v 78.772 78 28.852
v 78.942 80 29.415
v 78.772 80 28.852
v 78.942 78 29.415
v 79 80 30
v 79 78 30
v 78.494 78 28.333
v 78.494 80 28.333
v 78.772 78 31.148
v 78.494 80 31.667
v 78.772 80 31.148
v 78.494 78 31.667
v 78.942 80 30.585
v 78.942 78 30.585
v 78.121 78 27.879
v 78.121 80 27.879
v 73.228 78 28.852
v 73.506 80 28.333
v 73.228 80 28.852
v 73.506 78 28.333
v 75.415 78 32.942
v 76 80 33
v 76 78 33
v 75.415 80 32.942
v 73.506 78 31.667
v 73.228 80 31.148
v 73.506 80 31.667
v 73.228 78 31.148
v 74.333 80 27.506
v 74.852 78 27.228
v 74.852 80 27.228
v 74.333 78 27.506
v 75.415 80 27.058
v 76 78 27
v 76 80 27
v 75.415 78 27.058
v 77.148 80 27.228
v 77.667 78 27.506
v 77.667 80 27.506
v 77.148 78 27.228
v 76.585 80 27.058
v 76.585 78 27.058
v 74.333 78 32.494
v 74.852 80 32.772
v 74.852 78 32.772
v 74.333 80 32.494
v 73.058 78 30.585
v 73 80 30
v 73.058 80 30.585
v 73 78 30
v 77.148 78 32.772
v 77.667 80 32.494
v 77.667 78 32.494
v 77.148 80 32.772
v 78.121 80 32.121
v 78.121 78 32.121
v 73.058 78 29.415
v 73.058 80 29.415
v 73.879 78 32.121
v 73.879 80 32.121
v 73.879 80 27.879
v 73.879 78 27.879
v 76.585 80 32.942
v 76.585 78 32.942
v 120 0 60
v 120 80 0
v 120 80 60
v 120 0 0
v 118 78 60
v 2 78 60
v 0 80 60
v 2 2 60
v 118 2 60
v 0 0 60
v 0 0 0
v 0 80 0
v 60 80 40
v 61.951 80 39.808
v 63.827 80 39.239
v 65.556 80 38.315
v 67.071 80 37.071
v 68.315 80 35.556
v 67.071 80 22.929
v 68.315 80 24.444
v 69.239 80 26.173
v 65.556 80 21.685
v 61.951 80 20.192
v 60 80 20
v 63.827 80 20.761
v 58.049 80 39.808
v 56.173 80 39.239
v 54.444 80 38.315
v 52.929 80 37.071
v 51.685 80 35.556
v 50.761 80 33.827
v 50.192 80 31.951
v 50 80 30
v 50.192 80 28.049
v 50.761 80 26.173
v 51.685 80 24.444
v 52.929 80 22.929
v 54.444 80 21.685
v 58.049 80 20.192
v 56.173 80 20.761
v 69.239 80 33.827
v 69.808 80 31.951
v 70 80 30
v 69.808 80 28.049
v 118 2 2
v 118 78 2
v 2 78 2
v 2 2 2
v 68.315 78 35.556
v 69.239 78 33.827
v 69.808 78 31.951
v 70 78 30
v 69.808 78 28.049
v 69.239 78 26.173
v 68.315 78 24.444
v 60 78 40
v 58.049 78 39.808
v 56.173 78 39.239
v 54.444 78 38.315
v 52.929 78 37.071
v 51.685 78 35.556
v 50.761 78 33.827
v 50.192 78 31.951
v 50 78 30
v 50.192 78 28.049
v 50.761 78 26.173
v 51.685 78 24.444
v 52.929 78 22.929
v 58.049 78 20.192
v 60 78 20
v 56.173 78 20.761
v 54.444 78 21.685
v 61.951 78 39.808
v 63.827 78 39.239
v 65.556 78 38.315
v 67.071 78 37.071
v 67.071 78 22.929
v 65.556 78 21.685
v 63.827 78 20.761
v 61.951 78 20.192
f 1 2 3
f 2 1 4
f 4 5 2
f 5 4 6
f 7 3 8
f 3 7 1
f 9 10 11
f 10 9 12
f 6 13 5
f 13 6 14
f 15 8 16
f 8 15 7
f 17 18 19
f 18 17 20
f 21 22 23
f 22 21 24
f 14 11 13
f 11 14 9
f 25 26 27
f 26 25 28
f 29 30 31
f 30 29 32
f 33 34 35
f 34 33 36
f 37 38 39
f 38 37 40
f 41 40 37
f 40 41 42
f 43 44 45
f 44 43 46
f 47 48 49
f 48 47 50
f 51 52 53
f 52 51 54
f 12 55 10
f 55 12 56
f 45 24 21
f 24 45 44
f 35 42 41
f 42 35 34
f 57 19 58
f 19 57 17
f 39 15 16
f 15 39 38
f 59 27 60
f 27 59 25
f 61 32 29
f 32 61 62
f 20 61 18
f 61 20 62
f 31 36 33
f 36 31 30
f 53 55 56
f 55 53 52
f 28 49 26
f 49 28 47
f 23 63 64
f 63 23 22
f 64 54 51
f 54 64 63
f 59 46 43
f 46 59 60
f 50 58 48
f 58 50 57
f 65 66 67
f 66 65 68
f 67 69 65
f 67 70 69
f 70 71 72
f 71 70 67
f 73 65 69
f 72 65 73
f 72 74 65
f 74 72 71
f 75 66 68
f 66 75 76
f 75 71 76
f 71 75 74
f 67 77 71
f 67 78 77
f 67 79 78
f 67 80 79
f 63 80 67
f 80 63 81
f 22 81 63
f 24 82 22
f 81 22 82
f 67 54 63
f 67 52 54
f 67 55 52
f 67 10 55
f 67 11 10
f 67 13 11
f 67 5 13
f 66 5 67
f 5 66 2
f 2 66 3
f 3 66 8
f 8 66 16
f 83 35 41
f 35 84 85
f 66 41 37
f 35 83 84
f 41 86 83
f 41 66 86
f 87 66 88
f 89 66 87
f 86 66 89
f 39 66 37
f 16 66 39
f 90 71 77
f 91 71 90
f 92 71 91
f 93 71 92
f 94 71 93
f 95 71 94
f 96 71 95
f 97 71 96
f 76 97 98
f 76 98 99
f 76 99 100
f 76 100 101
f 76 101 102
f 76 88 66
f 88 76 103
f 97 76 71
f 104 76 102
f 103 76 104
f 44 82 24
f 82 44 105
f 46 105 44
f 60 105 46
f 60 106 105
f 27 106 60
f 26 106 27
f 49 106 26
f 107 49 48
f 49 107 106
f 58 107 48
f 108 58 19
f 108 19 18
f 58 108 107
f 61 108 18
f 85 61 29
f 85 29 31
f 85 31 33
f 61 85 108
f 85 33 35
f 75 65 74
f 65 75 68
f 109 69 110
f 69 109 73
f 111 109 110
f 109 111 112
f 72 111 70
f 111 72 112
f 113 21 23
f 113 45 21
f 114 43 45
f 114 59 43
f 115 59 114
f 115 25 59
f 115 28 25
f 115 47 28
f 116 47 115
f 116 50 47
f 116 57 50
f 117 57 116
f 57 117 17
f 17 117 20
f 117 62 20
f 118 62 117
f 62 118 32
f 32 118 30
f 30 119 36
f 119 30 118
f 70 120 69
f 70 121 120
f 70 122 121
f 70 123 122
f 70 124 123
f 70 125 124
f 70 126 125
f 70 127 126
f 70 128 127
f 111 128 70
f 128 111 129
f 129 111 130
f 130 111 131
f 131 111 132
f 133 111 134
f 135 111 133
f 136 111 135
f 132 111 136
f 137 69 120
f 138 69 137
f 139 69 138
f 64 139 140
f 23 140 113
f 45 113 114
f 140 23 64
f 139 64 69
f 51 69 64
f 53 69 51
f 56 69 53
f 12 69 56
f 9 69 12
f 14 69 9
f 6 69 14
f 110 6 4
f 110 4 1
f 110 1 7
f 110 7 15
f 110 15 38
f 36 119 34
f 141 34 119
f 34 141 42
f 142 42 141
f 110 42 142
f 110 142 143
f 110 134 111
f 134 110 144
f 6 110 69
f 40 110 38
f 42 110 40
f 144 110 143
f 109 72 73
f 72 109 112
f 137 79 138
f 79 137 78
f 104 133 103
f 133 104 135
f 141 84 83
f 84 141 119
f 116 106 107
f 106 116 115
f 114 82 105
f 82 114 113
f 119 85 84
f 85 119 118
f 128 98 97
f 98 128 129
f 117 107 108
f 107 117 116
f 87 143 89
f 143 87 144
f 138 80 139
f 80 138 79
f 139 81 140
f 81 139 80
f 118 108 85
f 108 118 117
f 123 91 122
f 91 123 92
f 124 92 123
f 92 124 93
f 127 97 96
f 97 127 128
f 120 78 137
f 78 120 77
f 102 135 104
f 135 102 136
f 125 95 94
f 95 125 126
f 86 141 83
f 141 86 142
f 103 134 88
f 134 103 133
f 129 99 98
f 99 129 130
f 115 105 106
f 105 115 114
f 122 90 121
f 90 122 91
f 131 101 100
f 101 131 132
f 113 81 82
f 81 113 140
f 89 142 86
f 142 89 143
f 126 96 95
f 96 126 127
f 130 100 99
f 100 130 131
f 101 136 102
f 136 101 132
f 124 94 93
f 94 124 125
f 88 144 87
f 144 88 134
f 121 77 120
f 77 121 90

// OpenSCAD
$fn = 32;

// ----------------------------------------------------------------------
// Vent box: roundvent enclosure
// ----------------------------------------------------------------------

// --- parameters (mm) ---
box_l = 120;              // box length, X
box_w = 80;               // box width, Y
box_h = 60;               // box height, Z
wall_t = 2;               // shell wall thickness
vent_d = 20;              // central vent diameter
ring_d = 6;               // ring hole diameter
n_ring = 6;               // holes in the ring
ring_r = 16;              // ring radius

ring_step = 360 / n_ring;  // ring hole angular step

difference() {
  cube([box_l, box_w, box_h]);
  translate([wall_t, wall_t, wall_t])
    cube([box_l - 2 * wall_t, box_w - 2 * wall_t, box_h]);
  translate([box_l / 2, box_w - wall_t - 1, box_h / 2])
    rotate([-90, 0, 0]) cylinder(h = wall_t + 2, d = vent_d);
  for (i = [0 : n_ring - 1])
    translate([box_l / 2, box_w - wall_t - 1, box_h / 2])
      rotate([0, 0, i * ring_step])
        translate([ring_r, 0, 0]) rotate([-90, 0, 0])
          cylinder(h = wall_t + 2, d = ring_d);
}
